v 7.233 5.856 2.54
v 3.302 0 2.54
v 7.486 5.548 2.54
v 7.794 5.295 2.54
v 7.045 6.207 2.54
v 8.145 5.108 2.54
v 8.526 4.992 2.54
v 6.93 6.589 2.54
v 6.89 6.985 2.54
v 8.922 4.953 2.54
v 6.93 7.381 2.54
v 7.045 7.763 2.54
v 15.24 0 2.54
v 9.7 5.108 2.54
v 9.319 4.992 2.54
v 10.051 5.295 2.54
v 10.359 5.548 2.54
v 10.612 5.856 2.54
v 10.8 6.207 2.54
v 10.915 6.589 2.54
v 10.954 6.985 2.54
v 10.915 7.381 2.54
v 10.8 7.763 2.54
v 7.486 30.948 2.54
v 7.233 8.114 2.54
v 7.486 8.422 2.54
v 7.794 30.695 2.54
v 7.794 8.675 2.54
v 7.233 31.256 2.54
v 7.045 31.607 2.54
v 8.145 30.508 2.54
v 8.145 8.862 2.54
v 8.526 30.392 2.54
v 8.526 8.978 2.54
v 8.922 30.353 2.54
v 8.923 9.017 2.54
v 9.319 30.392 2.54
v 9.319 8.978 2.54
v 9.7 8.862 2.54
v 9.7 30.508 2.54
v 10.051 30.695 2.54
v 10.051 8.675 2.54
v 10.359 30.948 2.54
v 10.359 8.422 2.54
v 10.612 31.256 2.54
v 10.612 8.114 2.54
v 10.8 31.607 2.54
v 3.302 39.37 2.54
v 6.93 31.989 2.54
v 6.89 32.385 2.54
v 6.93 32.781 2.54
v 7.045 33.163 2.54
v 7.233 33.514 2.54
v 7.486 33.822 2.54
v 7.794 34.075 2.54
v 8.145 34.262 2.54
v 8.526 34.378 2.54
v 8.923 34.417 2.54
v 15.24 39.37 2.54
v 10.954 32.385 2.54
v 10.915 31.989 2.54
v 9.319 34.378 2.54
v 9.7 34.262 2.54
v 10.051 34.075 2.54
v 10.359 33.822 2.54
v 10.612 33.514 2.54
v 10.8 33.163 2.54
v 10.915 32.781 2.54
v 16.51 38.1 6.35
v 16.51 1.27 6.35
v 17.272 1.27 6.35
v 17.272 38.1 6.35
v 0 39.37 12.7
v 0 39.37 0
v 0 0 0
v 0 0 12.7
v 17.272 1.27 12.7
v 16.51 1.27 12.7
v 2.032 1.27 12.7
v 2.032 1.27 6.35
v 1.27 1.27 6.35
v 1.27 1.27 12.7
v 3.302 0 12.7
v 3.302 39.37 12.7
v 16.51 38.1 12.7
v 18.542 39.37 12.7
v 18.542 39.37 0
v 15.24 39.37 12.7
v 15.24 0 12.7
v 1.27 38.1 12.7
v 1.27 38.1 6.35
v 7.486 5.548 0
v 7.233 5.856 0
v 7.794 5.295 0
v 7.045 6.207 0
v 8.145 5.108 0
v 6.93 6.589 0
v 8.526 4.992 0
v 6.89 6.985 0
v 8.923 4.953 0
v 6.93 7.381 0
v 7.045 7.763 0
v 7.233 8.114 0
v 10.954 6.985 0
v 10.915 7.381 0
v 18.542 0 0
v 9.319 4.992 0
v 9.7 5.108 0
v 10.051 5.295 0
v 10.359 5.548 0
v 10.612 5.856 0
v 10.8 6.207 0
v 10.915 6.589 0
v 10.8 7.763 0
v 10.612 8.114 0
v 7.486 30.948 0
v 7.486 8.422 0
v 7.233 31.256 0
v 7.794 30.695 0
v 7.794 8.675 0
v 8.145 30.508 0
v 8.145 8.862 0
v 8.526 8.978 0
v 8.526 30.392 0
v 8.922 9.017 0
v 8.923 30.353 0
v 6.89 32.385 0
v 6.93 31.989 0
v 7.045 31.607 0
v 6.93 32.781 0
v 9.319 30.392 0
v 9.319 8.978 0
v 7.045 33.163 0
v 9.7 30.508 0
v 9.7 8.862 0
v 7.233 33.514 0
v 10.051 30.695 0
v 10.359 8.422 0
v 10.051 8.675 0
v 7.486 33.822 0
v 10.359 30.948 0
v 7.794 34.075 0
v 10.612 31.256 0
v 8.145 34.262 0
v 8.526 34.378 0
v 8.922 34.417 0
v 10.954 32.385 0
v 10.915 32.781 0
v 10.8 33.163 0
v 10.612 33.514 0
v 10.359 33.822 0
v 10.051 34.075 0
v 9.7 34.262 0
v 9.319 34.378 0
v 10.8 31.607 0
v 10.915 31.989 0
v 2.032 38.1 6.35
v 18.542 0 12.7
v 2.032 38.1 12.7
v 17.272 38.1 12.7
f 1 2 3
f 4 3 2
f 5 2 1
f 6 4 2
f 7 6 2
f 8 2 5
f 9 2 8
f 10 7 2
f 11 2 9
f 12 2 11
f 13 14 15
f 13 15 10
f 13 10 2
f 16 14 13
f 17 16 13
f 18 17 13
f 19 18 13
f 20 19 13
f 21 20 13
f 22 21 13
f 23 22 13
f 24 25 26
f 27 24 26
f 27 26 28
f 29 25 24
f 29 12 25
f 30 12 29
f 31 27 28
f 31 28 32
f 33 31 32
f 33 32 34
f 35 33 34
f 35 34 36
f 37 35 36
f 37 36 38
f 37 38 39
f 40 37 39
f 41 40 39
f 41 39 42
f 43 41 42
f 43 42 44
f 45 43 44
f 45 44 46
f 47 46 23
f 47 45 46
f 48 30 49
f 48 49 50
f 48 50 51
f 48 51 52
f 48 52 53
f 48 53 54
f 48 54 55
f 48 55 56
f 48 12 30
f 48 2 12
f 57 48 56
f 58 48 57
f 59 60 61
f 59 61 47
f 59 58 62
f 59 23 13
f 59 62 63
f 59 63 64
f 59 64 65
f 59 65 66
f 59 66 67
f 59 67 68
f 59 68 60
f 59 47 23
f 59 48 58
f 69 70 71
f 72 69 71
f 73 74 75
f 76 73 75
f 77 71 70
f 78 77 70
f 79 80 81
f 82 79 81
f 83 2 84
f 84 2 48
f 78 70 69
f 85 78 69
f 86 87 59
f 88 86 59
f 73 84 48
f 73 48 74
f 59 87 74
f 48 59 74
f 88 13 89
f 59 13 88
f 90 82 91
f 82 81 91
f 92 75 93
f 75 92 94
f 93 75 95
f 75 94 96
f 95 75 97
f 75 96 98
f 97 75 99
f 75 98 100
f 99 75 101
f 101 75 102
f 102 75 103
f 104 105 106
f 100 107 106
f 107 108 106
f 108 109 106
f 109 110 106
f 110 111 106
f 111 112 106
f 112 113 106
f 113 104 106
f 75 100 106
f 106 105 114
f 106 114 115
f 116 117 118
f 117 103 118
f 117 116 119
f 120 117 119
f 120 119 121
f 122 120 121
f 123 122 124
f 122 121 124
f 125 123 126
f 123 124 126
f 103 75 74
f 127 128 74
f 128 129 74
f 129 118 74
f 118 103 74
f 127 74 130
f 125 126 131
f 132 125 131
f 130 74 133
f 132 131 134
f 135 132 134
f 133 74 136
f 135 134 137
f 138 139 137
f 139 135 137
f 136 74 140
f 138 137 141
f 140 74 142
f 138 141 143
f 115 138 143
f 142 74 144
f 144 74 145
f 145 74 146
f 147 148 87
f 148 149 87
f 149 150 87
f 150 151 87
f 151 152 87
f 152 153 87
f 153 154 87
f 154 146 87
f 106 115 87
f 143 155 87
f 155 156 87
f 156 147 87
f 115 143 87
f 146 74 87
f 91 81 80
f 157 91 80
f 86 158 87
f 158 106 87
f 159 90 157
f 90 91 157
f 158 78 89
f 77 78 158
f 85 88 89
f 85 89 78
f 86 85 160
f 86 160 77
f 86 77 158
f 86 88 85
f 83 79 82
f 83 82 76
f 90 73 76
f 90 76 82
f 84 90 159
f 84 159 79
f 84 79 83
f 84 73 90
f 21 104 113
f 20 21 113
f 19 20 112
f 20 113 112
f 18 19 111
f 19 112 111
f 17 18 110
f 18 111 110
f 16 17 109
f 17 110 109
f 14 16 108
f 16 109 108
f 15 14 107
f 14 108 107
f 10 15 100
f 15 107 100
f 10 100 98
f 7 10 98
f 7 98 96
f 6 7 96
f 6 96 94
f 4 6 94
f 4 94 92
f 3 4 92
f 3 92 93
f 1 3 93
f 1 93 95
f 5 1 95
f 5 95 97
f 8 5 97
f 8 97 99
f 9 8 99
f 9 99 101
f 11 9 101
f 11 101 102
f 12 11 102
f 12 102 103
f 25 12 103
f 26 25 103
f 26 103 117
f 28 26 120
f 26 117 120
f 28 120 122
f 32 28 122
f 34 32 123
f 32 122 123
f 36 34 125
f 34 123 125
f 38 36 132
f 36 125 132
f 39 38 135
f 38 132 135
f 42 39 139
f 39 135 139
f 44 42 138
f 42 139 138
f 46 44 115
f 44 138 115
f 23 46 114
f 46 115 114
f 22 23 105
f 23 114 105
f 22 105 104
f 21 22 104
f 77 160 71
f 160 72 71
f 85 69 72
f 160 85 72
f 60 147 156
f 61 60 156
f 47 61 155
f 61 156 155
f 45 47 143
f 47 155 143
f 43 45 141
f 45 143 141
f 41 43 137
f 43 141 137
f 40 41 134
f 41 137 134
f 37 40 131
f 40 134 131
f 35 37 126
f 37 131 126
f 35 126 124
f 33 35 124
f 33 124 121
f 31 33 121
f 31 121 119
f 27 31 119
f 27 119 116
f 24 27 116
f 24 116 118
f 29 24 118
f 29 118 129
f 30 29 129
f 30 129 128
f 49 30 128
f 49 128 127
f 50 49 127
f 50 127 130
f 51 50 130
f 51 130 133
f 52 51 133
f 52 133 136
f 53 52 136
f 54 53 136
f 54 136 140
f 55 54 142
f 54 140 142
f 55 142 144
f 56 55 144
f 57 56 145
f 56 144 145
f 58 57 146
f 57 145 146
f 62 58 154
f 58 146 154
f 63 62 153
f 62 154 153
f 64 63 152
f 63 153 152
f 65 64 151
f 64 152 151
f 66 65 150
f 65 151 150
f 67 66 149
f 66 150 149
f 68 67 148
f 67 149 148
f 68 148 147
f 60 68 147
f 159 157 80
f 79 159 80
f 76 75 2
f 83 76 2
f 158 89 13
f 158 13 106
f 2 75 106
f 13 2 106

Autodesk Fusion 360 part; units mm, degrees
sketch "Sketch1" plane through (0, 0, 0) normal (0, 0, 1) x (1, 0, 0)
  line L0 (0, 0) -> (18.542, 0)
  line L1 (18.542, 0) -> (18.542, 39.37)
  line L2 (18.542, 39.37) -> (0, 39.37)
  line L3 (0, 39.37) -> (0, 0)
  line L4 (3.302, 0) -> (3.302, 39.37)
  line L5 (15.24, 0) -> (15.24, 39.37)
  line L6 (16.51, 38.1) -> (17.272, 38.1)
  line L7 (17.272, 38.1) -> (17.272, 1.27)
  line L8 (17.272, 1.27) -> (16.51, 1.27)
  line L9 (16.51, 1.27) -> (16.51, 38.1)
  line L10 (1.27, 38.1) -> (2.032, 38.1)
  line L11 (2.032, 38.1) -> (2.032, 1.27)
  line L12 (2.032, 1.27) -> (1.27, 1.27)
  line L13 (1.27, 1.27) -> (1.27, 38.1)
  line L14 (-1.6611, 32.385) -> (20.0985, 32.385) construction
  line L15 (-1.6611, 6.985) -> (20.0985, 6.985) construction
  line L16 (8.9225, 41.0496) -> (8.9225, -1.9164) construction
  circle A0 centre (8.9225, 32.385) radius 2.032
  circle A1 centre (8.9225, 6.985) radius 2.032
  dimension "d1" = 18.542
  dimension "d2" = 39.37
  dimension "d3" = 3.302
  dimension "d4" = 3.302
  dimension "d5" = 36.83
  dimension "d6" = 1.27
  dimension "d7" = 0.762
  dimension "d8" = 1.27
  dimension "d9" = 36.83
  dimension "d11" = 0.762
  dimension "d12" = 1.27
  dimension "d13" = 1.27
  dimension "d26" = 6.985
  dimension "d27" = 6.985
  dimension "d28" = 4.064
  dimension "d29" = 4.064
extrude "Extrude1" add sketch "Sketch1" along normal blind 2.54 contours L0 L2 L4 L5 | A0 | A1
extrude "Extrude2" add sketch "Sketch1" along normal blind 12.7 contours L0 L1 L2 L5
extrude "Extrude3" add sketch "Sketch1" along normal blind 12.7 contours L0 L2 L3 L4
extrude "Extrude4" add sketch "Sketch1" along normal blind 6.35 contours L6 L7 L8 L9
extrude "Extrude5" add sketch "Sketch1" along normal blind 6.35 contours L10 L11 L12 L13
extrude "Extrude6" cut sketch "Sketch1" along normal through all contours A0
extrude "Extrude7" cut sketch "Sketch1" along normal through all contours A1
